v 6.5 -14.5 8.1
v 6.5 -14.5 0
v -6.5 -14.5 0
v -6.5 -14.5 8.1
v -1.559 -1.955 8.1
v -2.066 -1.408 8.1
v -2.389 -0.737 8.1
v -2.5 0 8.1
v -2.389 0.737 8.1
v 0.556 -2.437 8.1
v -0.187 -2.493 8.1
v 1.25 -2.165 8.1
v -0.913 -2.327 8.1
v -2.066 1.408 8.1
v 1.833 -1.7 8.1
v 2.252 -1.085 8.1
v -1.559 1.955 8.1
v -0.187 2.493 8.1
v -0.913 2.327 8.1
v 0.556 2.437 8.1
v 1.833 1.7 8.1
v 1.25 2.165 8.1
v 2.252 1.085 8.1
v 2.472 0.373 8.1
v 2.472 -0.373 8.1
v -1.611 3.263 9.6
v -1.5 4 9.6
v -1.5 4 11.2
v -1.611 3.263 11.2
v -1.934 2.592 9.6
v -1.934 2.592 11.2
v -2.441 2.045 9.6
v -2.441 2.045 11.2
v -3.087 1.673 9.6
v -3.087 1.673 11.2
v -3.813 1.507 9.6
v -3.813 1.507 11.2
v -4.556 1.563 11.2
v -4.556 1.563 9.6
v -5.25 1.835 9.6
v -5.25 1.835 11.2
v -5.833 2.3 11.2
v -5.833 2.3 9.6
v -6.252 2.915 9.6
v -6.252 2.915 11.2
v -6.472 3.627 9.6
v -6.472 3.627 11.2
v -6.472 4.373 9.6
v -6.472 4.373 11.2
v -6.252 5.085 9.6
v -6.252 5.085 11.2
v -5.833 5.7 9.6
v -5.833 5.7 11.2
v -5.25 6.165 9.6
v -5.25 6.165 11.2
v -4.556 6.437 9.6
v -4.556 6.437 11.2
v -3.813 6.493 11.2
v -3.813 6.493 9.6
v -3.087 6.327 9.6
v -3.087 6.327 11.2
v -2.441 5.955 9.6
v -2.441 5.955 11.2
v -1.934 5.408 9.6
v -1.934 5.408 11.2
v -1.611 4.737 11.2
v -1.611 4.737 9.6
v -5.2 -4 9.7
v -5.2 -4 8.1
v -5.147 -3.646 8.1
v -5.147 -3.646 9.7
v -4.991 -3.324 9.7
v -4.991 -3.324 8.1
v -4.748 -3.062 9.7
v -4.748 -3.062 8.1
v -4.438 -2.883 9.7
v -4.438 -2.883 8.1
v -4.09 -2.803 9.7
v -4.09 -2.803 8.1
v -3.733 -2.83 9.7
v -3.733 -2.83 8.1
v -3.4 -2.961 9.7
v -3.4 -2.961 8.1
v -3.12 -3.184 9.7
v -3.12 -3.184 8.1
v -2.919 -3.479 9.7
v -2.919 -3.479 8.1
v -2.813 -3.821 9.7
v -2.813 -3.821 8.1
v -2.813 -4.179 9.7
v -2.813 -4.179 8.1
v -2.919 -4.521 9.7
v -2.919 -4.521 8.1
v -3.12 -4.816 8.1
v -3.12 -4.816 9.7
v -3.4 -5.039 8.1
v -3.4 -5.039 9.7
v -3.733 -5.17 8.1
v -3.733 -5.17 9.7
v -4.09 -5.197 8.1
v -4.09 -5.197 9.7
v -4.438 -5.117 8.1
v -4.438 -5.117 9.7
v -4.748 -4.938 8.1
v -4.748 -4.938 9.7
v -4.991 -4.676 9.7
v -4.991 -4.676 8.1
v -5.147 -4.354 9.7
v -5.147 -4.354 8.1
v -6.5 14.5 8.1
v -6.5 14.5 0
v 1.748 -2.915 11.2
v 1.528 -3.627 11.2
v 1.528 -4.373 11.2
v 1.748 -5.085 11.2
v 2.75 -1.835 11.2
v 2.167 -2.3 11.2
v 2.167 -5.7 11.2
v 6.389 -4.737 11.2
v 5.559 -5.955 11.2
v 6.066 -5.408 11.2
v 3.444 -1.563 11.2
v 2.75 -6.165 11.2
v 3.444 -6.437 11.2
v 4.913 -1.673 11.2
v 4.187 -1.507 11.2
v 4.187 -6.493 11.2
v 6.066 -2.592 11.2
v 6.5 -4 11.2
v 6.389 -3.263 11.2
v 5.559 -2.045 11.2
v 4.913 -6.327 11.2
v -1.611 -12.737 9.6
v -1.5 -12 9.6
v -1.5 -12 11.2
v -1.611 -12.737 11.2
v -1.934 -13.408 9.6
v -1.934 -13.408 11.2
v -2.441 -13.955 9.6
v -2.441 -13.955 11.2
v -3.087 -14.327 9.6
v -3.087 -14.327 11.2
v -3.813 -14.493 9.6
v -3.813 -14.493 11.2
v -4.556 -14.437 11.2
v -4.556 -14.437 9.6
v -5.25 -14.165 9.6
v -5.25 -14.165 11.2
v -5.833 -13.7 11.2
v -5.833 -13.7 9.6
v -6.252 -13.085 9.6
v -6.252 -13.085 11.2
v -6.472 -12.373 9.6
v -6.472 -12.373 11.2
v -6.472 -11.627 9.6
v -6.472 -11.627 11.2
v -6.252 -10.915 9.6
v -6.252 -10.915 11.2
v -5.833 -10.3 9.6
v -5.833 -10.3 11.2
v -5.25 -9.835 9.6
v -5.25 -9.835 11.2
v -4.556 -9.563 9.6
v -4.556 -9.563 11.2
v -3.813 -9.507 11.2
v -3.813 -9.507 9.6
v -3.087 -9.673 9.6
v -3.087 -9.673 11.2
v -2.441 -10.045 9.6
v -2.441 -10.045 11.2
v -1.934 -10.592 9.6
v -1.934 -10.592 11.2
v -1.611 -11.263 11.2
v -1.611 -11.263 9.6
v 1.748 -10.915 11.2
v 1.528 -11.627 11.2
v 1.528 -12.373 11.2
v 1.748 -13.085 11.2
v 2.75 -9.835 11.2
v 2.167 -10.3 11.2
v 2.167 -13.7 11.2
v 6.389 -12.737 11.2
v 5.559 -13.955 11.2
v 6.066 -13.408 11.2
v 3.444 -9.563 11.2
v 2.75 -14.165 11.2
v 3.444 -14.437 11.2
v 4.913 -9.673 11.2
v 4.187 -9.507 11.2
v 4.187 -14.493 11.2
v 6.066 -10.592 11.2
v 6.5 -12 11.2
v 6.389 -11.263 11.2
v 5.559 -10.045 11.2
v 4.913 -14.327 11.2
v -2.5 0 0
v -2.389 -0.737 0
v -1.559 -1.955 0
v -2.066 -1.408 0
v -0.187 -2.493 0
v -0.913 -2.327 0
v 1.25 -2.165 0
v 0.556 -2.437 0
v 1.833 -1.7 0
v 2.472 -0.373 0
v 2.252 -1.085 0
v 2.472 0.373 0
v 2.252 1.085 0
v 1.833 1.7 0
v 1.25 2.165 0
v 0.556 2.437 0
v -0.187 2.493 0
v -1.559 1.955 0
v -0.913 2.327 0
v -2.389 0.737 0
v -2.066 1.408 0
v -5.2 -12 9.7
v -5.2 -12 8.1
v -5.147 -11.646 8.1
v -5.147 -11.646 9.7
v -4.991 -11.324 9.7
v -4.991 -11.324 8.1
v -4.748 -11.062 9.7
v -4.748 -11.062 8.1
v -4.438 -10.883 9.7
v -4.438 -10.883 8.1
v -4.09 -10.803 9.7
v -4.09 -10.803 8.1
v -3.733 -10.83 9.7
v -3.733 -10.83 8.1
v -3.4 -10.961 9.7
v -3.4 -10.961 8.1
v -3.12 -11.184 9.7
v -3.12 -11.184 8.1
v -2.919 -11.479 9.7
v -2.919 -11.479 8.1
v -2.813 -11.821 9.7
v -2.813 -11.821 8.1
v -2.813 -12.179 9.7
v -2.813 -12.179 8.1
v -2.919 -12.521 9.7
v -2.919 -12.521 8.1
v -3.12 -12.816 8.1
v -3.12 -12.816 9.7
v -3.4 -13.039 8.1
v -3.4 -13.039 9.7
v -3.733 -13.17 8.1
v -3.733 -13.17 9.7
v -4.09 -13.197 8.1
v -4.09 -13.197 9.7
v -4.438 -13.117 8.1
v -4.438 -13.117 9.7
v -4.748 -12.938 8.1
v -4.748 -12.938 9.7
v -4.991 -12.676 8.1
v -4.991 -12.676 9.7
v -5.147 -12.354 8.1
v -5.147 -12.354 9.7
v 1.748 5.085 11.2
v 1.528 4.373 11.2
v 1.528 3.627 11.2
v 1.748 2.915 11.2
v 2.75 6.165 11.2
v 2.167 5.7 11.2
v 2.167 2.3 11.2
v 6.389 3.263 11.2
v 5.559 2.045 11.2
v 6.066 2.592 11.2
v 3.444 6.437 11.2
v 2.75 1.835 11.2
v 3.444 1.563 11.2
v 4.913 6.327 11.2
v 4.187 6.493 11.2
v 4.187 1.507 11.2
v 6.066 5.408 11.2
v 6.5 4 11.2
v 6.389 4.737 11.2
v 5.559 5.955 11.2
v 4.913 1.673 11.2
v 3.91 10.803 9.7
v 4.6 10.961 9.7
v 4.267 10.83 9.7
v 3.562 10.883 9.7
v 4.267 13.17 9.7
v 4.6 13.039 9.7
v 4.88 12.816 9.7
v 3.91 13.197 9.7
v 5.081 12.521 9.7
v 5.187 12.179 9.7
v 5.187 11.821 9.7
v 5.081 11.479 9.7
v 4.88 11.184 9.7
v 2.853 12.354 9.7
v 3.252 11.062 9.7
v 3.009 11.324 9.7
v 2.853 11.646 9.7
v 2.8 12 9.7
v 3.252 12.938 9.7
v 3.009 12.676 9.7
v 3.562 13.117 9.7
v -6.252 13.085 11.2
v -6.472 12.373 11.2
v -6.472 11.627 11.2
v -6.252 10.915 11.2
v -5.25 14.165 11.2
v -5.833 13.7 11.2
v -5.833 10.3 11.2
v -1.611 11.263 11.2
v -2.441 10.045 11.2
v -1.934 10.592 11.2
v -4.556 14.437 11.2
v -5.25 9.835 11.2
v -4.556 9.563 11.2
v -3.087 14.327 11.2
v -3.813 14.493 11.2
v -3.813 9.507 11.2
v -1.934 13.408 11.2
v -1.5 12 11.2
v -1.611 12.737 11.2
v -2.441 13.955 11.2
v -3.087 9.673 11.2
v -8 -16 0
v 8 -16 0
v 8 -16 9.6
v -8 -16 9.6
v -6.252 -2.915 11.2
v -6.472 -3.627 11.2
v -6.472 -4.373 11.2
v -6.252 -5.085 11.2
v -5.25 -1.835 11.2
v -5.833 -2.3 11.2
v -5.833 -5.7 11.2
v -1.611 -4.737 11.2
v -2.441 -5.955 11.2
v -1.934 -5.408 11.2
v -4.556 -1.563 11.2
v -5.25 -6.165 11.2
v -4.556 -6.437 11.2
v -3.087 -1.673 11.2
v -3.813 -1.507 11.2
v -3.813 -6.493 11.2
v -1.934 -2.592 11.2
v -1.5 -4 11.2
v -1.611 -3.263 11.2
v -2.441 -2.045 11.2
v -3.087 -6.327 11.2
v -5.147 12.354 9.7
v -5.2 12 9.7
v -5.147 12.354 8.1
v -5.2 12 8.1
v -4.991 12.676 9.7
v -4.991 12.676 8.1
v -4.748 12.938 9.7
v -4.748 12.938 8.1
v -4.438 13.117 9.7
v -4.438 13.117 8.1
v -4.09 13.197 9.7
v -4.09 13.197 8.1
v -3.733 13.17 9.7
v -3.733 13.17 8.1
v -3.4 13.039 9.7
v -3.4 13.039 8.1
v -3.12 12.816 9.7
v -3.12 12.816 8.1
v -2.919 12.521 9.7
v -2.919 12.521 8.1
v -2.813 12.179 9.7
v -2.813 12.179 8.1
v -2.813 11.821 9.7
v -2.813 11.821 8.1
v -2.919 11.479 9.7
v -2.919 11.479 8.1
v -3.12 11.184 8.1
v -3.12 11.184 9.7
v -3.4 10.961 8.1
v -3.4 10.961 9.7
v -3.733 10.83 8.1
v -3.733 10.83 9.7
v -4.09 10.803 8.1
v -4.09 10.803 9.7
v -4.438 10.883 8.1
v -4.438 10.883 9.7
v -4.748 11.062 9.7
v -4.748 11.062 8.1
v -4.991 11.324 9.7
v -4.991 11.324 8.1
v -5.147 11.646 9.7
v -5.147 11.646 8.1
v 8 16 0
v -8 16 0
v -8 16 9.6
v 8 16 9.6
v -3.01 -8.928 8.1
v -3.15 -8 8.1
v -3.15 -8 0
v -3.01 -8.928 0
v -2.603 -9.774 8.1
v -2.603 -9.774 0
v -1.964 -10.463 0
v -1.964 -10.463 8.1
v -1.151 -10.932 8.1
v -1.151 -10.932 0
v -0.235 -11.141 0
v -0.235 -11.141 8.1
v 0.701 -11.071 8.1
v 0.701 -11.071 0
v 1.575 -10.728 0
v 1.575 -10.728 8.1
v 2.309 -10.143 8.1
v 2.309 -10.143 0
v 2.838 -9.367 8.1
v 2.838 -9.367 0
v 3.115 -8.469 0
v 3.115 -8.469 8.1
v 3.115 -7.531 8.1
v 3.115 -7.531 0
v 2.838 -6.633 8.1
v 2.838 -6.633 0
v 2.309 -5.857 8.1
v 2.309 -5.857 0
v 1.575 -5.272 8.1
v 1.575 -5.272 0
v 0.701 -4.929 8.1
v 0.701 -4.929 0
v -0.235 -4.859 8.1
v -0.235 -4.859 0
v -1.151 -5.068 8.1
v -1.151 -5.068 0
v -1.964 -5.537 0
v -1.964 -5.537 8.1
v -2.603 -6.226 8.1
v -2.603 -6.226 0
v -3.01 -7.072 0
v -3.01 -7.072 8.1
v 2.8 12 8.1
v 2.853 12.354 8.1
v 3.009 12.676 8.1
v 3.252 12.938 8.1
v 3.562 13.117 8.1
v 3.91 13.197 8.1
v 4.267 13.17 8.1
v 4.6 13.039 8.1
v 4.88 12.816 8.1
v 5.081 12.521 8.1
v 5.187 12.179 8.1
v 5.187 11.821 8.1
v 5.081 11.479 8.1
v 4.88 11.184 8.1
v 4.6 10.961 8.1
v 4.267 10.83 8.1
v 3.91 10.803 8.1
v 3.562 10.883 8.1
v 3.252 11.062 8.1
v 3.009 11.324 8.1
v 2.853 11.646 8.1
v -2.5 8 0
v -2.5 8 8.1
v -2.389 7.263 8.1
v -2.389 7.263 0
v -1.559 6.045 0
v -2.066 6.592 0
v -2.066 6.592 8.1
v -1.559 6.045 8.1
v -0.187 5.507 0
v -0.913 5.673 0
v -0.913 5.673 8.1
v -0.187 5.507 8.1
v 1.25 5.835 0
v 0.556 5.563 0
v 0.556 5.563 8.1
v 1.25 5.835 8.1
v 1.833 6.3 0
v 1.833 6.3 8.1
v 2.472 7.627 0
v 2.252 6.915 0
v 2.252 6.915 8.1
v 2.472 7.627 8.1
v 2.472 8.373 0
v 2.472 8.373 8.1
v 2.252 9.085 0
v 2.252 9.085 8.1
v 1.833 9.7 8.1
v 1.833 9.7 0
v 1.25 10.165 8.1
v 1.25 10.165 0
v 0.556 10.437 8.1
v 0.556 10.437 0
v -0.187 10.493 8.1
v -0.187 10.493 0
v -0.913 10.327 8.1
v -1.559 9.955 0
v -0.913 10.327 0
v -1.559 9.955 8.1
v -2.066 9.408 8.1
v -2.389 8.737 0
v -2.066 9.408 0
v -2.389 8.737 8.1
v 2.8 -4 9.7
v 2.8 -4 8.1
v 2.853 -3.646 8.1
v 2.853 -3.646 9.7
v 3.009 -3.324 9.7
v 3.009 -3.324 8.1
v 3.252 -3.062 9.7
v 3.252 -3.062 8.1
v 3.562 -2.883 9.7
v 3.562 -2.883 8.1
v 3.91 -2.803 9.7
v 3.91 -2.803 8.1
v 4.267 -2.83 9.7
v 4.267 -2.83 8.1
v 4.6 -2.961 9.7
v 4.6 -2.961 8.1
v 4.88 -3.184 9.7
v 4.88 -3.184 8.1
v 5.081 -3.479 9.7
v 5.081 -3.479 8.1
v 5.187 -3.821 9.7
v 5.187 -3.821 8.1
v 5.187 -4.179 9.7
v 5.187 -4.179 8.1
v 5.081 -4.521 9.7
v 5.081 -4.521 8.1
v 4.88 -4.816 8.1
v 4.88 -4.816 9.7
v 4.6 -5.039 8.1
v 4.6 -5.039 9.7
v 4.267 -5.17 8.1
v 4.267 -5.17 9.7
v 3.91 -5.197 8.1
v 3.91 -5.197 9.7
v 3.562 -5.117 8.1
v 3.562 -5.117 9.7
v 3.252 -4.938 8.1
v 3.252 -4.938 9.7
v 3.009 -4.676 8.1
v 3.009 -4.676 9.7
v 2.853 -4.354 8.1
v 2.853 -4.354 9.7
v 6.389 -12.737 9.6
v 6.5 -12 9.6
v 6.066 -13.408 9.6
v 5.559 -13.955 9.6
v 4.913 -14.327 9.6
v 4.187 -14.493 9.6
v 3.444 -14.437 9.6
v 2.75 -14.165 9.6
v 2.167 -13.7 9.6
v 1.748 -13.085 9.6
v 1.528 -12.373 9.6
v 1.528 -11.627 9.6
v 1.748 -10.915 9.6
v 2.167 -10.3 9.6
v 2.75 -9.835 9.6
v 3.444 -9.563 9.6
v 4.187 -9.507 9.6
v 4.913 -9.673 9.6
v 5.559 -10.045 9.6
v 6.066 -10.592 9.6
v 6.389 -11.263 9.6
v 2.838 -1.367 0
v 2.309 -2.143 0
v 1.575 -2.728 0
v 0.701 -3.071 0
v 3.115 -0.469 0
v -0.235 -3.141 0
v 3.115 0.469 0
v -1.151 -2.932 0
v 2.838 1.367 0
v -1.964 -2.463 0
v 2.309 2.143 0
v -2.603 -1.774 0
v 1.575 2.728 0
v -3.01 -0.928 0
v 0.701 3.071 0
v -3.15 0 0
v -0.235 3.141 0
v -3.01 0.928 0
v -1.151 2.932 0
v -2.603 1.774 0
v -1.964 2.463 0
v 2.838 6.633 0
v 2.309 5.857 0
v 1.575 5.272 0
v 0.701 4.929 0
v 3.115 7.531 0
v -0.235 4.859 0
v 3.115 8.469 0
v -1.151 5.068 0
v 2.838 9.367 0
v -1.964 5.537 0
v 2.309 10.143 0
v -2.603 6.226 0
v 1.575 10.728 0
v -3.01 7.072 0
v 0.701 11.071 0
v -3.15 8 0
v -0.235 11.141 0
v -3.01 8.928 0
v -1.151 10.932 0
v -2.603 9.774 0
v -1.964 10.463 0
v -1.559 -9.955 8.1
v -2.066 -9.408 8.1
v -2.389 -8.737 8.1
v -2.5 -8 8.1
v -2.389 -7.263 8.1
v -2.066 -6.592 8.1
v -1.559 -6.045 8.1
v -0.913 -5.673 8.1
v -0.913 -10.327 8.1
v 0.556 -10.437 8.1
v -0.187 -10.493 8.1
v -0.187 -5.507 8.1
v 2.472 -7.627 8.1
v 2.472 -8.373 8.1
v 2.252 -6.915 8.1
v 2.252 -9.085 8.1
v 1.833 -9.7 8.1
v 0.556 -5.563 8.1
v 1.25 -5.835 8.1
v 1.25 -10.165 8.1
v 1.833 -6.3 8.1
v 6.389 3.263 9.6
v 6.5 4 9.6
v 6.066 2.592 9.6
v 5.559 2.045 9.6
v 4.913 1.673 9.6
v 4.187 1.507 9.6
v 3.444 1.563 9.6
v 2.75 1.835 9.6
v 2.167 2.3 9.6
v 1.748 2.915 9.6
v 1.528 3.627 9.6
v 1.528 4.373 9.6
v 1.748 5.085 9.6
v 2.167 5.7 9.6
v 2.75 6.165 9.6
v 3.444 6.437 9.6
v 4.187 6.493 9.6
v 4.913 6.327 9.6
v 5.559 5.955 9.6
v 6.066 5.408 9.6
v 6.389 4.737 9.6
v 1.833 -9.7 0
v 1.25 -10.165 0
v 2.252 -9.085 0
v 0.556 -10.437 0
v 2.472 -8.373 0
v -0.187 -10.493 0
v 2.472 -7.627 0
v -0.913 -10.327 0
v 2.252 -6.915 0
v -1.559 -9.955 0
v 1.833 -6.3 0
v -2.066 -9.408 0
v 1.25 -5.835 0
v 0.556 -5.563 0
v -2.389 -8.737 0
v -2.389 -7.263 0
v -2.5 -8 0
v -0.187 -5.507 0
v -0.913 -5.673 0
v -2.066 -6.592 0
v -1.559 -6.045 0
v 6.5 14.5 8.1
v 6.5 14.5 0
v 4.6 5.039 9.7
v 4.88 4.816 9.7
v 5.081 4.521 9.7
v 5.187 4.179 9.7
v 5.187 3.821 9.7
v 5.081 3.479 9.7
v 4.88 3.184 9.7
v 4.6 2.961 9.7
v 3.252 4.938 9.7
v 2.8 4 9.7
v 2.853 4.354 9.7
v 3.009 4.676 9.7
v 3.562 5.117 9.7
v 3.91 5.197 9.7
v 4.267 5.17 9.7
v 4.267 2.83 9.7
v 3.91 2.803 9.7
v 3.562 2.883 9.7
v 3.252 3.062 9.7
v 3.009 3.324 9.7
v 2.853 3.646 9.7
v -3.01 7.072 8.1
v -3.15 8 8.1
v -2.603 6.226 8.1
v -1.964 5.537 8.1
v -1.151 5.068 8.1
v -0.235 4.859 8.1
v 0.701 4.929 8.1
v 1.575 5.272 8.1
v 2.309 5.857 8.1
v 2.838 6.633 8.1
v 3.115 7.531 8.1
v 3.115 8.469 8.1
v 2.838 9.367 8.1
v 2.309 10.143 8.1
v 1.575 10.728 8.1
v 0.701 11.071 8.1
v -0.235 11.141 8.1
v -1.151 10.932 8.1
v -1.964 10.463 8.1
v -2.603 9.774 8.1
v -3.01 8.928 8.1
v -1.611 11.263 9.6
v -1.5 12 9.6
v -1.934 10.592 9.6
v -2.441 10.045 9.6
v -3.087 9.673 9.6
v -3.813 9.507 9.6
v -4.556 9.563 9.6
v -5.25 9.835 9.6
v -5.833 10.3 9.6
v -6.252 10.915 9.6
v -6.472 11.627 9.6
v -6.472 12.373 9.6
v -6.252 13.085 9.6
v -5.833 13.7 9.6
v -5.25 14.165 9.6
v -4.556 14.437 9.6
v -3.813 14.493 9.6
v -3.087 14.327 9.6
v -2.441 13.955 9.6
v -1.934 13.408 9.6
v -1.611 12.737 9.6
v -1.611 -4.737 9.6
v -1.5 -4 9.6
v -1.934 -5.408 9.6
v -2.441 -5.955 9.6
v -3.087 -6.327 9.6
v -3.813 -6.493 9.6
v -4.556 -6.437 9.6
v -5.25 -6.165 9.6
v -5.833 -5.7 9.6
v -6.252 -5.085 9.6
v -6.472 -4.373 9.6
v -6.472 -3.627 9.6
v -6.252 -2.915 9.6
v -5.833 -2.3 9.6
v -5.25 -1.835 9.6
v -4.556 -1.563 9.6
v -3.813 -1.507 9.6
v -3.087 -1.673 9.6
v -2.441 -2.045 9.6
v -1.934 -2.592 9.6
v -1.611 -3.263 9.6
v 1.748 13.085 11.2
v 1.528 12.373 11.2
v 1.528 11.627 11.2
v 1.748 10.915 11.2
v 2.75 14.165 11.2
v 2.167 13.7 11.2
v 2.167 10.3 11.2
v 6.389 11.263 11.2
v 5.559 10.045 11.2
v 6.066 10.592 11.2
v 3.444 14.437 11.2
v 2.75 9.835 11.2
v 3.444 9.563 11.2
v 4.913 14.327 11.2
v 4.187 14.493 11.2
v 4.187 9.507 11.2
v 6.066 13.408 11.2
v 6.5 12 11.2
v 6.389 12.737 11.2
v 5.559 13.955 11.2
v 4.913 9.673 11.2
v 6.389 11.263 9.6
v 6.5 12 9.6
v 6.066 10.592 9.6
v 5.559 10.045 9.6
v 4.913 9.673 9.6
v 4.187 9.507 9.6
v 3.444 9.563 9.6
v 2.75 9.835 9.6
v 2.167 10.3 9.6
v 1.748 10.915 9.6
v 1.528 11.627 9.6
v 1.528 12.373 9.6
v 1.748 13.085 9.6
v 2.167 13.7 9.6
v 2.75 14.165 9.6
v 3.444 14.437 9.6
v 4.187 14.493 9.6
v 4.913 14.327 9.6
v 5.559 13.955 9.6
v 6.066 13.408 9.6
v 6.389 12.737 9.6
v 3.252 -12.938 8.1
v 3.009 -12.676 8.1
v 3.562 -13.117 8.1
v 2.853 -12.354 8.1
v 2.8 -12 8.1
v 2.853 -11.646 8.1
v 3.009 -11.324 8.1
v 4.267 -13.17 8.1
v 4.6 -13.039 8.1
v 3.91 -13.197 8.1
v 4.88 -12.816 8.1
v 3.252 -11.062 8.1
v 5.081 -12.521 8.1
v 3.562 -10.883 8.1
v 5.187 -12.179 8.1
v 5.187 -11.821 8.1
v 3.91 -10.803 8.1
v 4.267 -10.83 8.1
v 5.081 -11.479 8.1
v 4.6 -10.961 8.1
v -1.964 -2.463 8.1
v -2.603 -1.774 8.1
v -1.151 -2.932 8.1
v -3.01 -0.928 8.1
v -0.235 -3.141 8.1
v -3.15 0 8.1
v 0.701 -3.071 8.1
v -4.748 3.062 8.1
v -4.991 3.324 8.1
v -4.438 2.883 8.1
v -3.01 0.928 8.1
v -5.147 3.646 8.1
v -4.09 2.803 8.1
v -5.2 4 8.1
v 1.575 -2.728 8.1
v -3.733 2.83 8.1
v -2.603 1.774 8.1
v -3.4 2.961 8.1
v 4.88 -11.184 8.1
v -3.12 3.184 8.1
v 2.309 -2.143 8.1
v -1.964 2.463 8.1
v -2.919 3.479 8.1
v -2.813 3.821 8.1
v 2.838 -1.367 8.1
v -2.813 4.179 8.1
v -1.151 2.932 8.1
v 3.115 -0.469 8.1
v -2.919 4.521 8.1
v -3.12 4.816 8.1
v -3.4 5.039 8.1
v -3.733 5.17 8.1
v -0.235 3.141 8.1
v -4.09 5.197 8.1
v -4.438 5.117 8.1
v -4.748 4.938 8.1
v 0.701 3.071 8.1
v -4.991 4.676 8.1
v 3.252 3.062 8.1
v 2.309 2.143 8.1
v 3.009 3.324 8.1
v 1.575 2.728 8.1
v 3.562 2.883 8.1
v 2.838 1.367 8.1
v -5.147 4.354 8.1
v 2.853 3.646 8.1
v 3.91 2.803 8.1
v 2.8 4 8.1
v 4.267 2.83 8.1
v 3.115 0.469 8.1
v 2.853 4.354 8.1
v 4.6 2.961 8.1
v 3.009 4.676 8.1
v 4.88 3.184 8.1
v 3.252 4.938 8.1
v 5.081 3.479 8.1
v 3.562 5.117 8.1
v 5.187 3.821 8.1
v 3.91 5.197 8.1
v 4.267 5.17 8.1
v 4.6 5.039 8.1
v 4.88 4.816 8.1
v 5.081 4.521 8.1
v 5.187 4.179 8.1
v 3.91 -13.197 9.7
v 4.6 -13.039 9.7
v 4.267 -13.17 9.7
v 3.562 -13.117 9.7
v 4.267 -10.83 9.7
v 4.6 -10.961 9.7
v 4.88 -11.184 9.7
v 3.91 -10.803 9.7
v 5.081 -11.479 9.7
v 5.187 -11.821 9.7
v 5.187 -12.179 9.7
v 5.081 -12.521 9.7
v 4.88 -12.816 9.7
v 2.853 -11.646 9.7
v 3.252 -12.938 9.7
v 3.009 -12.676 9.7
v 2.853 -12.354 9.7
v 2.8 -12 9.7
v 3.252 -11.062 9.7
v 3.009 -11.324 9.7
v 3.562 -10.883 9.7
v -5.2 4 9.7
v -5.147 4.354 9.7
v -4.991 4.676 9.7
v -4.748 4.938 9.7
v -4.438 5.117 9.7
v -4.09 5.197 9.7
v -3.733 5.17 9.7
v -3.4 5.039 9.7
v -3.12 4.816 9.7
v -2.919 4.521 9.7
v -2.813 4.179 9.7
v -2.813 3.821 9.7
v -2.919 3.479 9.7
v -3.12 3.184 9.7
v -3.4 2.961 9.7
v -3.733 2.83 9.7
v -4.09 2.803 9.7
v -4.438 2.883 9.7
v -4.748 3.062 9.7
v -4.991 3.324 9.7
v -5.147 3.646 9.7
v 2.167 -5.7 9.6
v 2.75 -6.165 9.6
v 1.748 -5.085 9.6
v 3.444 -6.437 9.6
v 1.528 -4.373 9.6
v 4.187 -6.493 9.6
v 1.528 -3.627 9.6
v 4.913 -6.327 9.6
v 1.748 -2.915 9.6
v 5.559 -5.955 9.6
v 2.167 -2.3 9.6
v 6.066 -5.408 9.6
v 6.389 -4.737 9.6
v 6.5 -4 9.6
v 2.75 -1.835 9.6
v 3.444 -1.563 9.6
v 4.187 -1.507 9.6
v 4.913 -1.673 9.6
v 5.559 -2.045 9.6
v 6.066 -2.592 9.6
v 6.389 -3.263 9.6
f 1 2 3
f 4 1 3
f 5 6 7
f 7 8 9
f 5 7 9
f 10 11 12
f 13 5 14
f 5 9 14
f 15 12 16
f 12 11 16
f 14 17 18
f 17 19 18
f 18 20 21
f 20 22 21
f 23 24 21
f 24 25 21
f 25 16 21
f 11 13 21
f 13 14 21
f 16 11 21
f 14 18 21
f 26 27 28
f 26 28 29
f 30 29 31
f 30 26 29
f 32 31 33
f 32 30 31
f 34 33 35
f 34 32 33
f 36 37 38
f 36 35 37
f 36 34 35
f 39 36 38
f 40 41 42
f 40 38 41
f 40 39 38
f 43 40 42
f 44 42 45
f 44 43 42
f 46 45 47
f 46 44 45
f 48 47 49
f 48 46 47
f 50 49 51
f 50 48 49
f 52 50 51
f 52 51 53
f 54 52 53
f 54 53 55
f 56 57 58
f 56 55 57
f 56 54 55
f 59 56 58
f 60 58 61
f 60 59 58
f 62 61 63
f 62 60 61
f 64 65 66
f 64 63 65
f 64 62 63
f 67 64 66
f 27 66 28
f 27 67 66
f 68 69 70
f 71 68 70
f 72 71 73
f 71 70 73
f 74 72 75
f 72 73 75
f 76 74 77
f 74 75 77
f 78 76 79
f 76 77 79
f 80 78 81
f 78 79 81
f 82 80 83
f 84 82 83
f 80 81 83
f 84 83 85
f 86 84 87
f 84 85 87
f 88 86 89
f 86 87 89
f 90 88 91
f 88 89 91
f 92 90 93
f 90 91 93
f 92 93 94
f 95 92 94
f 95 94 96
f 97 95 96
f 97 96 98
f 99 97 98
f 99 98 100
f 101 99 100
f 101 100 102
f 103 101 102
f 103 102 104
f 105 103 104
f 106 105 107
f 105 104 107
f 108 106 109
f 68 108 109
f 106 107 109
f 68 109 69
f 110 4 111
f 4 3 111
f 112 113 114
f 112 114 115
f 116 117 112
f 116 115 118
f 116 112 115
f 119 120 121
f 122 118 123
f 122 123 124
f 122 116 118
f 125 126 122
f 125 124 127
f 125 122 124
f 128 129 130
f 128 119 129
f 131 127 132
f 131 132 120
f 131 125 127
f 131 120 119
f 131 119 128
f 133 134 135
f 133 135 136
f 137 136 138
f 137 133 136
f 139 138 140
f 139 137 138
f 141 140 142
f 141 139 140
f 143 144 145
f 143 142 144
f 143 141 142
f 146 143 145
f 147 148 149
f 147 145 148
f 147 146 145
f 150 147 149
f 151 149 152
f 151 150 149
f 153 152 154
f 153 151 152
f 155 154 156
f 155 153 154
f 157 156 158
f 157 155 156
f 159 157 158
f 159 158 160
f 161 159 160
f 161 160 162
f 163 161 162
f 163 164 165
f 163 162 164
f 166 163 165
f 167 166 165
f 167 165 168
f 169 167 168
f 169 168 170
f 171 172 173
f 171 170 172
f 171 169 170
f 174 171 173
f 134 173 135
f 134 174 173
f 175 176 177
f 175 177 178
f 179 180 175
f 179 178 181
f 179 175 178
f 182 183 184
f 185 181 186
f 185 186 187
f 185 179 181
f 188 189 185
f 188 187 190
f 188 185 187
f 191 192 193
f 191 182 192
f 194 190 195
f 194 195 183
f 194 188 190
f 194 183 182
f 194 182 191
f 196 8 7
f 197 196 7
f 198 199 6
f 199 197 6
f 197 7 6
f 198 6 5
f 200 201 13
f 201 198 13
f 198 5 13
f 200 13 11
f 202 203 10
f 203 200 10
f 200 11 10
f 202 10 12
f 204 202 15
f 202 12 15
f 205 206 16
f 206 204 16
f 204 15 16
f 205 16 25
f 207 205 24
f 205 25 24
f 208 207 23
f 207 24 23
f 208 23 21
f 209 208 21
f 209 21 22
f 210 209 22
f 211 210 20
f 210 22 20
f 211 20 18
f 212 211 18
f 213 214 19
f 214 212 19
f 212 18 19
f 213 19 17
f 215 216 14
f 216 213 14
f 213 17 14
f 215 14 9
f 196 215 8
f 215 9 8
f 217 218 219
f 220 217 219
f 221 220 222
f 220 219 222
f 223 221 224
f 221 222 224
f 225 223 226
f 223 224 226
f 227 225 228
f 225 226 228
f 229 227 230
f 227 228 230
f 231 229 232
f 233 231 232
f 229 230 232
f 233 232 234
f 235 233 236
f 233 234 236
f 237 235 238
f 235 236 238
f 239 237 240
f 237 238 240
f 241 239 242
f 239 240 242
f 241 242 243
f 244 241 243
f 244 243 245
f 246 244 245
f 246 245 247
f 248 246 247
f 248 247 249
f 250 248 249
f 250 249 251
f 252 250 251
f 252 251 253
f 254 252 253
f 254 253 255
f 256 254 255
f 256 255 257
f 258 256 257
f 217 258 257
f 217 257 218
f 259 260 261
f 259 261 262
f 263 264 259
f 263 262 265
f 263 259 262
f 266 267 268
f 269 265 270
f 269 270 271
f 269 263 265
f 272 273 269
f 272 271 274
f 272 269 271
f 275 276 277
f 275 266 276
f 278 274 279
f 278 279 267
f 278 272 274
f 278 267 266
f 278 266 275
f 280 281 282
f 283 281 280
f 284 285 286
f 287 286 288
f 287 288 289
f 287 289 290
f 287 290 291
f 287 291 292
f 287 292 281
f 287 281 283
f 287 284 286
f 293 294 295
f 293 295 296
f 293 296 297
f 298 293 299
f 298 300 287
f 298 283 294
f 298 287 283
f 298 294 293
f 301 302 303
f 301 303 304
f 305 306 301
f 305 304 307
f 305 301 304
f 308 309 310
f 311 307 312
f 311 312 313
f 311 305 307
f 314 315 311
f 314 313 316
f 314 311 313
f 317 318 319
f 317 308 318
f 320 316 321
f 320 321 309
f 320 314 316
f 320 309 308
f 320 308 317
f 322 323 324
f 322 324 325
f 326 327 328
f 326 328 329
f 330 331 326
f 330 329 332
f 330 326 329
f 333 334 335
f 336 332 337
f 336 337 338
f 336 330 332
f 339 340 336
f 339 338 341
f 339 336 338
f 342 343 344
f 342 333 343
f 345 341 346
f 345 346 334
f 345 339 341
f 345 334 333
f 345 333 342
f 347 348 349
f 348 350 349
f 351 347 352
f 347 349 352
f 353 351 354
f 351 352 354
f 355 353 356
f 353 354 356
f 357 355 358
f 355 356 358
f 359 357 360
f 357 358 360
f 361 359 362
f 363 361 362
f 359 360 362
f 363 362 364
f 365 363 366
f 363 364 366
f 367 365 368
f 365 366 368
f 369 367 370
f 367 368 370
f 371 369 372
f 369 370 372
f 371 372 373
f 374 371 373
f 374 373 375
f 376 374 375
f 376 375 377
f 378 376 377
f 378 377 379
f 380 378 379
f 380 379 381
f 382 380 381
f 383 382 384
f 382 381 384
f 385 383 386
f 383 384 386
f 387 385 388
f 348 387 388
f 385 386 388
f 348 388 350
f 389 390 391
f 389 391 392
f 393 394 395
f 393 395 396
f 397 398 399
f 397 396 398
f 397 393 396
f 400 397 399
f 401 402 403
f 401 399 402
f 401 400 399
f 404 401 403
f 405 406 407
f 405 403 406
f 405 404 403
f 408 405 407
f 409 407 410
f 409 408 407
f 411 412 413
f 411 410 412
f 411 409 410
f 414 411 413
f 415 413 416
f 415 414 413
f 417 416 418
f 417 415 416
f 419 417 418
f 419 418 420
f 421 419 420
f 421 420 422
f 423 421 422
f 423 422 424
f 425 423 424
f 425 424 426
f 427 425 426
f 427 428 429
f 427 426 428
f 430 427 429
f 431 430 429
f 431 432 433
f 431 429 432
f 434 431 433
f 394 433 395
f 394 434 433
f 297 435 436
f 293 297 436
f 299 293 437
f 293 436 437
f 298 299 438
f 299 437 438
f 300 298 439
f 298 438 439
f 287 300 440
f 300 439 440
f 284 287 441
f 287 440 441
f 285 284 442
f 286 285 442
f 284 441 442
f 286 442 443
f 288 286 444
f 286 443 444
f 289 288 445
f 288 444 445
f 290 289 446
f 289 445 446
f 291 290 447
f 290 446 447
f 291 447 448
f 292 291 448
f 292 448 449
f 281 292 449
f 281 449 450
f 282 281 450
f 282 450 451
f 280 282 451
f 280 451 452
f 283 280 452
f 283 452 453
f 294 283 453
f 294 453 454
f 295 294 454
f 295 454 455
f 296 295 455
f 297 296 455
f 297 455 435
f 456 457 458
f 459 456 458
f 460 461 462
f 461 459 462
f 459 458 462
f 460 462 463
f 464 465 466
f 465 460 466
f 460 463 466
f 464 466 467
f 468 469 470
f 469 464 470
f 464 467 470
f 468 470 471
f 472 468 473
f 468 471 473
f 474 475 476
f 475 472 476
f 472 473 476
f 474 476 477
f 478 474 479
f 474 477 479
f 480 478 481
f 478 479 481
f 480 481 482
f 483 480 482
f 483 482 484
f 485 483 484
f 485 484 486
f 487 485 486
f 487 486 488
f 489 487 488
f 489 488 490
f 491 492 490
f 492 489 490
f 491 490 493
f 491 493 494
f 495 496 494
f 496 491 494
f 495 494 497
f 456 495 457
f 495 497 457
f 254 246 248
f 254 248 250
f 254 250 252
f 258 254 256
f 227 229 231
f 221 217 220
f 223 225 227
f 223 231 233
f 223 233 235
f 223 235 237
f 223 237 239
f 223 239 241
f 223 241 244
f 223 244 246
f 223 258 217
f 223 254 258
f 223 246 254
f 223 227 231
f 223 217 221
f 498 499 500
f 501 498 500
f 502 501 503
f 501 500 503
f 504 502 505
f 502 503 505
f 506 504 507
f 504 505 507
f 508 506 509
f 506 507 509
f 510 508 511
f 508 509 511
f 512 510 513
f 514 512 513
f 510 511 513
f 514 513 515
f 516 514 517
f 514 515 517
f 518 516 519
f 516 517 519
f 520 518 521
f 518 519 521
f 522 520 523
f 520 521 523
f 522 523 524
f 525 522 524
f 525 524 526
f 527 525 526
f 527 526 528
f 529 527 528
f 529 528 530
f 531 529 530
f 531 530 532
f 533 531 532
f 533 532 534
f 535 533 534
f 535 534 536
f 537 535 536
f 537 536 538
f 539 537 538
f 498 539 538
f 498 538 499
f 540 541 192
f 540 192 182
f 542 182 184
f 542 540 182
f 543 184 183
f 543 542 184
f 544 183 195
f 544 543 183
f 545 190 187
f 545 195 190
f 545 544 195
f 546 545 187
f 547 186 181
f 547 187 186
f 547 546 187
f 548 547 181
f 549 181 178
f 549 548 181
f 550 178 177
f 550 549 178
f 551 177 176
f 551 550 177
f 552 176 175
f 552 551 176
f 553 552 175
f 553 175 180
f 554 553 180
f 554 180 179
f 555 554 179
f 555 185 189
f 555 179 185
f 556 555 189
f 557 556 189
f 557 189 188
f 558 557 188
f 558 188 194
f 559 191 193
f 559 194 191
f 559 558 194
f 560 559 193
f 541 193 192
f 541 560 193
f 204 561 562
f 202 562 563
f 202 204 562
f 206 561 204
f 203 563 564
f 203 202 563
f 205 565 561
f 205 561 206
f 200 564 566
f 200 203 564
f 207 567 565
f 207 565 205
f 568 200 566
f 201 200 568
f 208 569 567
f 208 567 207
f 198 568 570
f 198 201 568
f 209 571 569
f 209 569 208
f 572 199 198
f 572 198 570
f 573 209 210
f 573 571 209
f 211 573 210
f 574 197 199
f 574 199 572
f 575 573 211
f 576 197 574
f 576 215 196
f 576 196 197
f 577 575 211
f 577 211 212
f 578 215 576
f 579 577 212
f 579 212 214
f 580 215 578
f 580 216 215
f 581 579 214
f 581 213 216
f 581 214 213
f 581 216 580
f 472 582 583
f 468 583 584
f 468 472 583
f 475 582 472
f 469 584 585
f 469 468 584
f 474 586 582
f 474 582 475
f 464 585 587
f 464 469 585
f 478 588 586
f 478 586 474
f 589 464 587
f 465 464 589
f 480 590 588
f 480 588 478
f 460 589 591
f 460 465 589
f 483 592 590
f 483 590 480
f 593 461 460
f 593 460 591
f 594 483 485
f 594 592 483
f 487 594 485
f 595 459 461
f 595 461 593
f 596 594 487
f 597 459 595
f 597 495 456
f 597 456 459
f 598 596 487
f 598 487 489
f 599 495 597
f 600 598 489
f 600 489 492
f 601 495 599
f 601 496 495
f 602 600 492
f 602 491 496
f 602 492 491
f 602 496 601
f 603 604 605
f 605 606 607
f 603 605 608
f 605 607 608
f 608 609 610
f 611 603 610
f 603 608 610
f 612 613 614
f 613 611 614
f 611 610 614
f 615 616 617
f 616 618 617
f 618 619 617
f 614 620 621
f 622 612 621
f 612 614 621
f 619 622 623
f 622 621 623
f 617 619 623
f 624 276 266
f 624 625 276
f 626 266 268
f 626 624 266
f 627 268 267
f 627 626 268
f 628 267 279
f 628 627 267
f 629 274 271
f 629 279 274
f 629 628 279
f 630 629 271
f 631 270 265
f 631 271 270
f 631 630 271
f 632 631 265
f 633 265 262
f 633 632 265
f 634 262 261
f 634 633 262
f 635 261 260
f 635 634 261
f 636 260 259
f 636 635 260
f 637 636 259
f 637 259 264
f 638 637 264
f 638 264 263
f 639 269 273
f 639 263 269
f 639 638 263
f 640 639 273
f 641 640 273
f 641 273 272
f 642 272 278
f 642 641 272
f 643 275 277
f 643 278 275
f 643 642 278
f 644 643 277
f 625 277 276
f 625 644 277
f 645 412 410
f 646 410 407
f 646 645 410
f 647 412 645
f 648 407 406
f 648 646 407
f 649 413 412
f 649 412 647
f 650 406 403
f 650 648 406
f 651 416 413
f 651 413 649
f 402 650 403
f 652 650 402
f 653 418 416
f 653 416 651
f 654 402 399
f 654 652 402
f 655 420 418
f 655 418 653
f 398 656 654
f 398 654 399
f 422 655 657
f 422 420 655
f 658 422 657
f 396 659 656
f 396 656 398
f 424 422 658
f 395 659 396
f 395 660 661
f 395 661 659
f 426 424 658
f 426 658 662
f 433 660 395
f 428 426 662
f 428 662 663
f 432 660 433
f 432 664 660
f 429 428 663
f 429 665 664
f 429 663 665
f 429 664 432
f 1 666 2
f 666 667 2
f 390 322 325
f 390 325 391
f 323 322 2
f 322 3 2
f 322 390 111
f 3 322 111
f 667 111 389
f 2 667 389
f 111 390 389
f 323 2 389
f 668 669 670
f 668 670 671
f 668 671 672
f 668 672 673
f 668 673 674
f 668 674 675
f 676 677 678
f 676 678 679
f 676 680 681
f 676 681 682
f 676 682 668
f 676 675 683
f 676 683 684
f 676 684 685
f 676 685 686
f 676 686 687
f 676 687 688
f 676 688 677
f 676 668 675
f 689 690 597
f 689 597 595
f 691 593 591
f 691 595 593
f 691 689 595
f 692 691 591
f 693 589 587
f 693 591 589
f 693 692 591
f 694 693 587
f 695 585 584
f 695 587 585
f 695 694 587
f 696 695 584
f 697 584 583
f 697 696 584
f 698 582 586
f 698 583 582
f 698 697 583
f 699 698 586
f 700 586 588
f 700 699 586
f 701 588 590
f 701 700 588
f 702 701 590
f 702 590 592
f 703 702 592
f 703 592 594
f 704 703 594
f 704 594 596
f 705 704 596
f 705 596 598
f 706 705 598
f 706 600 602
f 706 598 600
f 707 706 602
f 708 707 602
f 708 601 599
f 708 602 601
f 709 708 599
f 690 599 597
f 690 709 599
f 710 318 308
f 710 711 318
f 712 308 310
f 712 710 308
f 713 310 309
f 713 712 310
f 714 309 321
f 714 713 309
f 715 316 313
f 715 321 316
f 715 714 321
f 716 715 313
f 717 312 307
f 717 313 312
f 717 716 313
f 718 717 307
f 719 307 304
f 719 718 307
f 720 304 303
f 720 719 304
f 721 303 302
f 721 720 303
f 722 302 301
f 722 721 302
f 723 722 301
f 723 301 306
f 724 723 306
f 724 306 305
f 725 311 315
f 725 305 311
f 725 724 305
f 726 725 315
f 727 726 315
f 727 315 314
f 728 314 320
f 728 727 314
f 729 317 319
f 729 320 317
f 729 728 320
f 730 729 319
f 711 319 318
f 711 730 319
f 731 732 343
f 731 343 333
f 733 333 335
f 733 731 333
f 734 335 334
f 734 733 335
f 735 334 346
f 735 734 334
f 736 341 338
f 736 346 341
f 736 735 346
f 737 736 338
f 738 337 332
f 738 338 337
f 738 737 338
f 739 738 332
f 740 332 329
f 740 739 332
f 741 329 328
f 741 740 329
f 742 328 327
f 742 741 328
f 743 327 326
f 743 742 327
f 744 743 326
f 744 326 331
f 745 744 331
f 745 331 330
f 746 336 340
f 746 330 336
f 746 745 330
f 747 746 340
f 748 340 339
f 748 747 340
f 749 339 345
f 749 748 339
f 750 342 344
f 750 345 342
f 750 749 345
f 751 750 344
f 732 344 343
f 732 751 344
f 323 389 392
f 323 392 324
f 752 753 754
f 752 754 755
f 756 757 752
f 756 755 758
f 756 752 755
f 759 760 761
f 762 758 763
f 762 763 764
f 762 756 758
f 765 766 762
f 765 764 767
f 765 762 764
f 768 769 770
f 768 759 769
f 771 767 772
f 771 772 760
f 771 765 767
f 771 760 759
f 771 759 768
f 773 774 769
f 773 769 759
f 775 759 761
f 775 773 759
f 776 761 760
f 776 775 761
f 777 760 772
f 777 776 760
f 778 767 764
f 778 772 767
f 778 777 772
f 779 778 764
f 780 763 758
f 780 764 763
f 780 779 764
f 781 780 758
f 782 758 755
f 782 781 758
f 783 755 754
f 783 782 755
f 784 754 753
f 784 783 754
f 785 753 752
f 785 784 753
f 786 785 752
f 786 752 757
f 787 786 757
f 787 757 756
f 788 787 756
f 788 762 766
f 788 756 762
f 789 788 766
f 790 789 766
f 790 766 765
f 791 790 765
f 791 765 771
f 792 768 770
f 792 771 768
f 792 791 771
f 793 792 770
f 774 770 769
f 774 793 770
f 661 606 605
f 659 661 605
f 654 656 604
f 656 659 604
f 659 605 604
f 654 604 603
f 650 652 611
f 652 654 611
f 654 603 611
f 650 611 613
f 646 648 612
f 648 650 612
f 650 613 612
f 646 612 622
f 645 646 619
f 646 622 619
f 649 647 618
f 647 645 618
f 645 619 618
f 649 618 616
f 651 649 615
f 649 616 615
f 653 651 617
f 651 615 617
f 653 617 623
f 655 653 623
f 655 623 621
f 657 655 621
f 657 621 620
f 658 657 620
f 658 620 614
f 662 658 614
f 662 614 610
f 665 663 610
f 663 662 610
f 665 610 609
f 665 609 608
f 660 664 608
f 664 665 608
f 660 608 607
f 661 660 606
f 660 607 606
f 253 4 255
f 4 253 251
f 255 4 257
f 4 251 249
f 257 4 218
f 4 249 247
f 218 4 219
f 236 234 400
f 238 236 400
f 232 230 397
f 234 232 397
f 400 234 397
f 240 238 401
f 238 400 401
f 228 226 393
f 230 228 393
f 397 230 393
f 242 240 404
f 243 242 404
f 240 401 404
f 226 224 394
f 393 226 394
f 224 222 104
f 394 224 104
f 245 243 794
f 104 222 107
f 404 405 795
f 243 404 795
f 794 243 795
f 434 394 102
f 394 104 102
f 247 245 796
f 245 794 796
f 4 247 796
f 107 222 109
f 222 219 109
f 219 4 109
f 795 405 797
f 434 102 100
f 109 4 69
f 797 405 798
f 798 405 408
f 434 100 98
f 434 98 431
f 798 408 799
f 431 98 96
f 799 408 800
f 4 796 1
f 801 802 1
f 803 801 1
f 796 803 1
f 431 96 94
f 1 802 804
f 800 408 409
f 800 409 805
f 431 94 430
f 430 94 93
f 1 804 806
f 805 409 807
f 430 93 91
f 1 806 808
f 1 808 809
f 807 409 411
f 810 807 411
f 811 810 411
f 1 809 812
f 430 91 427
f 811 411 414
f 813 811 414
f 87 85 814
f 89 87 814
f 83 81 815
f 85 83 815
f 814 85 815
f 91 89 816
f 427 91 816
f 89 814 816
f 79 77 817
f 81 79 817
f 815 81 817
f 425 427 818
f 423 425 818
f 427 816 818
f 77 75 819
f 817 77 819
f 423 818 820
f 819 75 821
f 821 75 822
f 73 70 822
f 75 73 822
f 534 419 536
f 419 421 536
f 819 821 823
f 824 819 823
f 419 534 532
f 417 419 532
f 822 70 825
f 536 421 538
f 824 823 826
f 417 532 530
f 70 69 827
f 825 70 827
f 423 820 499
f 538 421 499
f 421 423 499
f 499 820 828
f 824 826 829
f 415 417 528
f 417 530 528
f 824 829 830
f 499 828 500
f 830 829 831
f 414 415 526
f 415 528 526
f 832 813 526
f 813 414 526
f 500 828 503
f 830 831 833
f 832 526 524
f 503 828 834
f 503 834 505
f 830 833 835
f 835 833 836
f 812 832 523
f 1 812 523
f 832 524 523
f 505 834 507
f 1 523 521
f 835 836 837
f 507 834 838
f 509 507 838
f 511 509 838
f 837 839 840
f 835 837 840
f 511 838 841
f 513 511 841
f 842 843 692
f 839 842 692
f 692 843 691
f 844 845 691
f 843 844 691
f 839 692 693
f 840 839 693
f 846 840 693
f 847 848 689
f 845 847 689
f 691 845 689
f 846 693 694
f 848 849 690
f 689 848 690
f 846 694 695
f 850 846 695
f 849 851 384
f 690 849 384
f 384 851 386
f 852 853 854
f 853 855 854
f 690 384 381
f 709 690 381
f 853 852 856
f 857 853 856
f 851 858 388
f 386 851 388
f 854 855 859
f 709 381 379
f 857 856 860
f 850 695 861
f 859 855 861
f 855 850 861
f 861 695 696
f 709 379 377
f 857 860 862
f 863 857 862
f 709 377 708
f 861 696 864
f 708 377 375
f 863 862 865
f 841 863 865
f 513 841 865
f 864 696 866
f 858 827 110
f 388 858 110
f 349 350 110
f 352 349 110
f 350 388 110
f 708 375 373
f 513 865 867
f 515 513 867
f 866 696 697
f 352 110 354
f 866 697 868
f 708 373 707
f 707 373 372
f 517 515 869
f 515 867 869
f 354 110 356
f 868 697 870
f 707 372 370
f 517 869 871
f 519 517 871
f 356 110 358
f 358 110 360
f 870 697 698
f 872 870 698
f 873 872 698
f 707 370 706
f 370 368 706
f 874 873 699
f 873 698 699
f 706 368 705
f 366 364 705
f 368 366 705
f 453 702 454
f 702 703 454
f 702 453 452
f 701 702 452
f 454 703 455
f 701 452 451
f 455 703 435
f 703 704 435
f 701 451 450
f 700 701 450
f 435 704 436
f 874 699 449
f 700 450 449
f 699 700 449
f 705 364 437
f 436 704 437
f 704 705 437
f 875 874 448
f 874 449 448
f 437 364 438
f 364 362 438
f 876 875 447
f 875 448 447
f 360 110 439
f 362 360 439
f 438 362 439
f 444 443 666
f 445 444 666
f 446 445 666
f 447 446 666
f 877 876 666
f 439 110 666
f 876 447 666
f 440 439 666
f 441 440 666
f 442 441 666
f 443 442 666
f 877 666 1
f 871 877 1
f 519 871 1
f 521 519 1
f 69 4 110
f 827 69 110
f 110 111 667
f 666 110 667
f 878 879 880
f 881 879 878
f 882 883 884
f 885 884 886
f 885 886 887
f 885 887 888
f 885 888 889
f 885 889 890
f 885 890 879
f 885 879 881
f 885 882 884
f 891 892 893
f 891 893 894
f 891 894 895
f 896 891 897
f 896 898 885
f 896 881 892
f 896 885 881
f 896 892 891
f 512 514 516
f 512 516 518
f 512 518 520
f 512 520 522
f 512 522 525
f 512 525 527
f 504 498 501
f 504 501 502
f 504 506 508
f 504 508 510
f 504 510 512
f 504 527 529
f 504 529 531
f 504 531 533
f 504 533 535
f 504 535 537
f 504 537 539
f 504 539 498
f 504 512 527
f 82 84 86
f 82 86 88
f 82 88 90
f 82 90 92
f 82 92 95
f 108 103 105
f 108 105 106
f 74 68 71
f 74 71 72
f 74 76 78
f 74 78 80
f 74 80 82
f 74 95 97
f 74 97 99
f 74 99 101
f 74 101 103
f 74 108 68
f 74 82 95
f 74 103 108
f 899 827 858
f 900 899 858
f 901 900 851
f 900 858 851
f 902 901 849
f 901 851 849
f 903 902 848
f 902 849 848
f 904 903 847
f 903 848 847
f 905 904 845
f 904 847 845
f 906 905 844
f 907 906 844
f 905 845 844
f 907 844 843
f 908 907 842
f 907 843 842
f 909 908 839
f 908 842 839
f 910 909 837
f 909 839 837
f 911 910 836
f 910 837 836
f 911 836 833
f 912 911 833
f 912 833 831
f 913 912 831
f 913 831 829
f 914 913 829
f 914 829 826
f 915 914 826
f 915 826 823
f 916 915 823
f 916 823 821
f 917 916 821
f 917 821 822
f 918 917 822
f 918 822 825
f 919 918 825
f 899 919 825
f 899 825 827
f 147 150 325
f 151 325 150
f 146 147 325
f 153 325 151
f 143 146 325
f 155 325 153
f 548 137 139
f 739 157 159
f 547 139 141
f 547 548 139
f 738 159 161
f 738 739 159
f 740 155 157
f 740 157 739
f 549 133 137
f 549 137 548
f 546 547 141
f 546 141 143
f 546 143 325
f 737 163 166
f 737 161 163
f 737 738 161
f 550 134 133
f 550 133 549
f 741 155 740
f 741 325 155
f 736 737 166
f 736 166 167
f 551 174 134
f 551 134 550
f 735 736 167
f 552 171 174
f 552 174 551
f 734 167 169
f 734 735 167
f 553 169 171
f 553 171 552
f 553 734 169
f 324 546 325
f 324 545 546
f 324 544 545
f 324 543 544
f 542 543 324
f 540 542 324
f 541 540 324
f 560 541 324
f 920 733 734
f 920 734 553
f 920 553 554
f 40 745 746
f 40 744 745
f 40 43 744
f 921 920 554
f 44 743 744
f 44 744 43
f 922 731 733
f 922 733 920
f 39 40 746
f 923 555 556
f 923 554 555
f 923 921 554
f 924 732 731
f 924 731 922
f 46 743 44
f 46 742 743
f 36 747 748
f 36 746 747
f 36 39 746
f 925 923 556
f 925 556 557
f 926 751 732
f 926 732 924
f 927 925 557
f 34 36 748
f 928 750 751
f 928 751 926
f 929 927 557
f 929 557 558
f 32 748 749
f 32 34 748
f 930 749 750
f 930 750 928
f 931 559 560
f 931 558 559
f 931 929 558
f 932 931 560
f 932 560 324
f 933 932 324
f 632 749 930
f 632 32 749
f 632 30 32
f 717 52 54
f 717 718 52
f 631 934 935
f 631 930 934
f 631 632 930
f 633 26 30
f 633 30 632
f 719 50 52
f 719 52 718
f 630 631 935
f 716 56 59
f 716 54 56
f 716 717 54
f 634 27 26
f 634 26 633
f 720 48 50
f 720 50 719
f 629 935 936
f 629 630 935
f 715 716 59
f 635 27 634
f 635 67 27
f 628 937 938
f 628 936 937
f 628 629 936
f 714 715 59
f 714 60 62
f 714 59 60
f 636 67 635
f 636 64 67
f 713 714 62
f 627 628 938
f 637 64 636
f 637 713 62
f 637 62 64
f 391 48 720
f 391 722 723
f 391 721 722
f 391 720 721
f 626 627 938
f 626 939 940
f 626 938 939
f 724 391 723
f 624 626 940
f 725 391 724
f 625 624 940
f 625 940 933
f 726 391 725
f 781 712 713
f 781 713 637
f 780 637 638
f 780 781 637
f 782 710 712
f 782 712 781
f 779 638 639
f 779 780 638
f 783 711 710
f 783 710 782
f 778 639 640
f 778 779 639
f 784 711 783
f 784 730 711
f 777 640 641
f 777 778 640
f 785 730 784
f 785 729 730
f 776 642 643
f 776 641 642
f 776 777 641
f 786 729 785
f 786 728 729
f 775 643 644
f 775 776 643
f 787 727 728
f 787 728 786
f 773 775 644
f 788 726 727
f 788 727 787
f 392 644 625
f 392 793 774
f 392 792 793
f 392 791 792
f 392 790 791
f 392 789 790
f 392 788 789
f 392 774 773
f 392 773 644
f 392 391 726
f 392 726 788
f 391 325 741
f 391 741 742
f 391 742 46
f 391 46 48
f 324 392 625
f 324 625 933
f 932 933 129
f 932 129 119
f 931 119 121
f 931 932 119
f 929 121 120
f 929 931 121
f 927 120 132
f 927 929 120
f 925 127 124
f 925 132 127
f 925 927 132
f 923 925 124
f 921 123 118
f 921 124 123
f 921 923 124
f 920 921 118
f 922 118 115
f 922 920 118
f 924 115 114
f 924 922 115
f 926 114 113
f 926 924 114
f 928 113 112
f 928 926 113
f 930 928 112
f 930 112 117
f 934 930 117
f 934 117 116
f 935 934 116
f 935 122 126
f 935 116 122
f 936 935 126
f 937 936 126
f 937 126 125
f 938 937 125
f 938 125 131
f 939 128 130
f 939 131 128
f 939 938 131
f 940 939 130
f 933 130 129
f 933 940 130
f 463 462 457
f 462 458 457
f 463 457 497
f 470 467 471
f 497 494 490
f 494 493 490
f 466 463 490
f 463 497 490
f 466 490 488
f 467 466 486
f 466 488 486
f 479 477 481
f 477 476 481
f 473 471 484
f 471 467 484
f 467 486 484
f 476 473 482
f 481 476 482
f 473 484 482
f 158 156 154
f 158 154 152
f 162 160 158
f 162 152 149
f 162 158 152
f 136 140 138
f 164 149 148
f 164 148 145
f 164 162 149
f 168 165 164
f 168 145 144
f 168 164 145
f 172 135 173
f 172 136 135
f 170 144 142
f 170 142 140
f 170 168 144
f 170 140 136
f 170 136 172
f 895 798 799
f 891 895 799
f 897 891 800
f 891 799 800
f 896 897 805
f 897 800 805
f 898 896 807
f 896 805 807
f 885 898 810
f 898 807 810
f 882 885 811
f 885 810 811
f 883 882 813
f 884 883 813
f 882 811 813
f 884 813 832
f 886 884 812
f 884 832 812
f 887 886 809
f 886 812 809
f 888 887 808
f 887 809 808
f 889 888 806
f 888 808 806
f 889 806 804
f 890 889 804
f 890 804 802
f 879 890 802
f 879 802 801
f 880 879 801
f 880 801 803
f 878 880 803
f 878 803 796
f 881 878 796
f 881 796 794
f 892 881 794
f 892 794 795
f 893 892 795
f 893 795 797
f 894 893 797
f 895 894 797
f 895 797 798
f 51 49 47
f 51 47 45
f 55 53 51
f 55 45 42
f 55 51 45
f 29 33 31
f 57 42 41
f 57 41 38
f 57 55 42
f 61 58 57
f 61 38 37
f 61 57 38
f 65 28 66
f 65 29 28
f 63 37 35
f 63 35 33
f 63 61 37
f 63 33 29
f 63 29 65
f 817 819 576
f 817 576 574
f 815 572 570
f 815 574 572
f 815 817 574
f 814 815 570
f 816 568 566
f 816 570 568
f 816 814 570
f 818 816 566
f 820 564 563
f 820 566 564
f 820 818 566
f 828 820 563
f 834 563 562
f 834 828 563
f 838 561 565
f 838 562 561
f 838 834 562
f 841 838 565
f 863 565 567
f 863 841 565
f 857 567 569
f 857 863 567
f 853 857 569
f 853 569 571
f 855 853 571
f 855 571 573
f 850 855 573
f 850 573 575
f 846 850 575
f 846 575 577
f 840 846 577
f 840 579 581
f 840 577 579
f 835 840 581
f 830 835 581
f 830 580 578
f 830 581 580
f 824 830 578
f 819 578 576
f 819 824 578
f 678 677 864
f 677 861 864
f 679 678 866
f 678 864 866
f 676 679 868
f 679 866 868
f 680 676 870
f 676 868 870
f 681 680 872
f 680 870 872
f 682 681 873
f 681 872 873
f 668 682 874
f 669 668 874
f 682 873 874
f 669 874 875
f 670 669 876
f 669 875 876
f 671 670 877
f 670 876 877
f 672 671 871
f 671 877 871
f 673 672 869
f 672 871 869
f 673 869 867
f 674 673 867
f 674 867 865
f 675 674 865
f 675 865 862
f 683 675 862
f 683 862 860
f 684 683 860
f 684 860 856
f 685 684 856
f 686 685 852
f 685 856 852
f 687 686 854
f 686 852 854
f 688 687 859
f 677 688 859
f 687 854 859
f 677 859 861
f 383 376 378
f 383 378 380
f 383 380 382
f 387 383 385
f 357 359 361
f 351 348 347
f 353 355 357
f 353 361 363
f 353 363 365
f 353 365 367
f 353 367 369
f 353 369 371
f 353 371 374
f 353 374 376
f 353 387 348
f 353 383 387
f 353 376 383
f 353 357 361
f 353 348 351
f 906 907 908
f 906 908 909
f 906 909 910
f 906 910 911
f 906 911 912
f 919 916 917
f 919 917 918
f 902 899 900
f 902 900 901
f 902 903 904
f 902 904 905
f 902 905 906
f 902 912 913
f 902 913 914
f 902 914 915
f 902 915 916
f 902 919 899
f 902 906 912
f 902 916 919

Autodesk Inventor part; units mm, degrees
ref_plane "YZ Plane" through (0, 0, 0) normal (1, 0, 0) x (0, 1, 0)
ref_plane "XZ Plane" through (0, 0, 0) normal (0, 1, 0) x (-1, 0, 0)
ref_plane "XY Plane" through (0, 0, 0) normal (0, 0, 1) x (1, 0, 0)
sketch "Sketch1" plane through (0, 0, 0) normal (0, 0, 1) x (1, 0, 0)
  line L0 (-8, 16) -> (8, 16)
  line L1 (8, 16) -> (8, -16)
  line L2 (8, -16) -> (-8, -16)
  line L3 (-8, -16) -> (-8, 16)
  point P0 (0, 0)
  dimension "d0" = 16
  dimension "d1" = 32
  dimension "d2" = 8
  dimension "d3" = 16
extrude "Extrusion1" add sketch "Sketch1" along normal blind 9.6
shell "Shell1" thickness 1.5 removed faces 1 at (-2.6667, -5.3333, 0)
sketch "Sketch2" plane through (0, 0, 9.6) normal (0, 0, 1) x (1, 0, 0)
  circle A0 centre (4, -12) radius 2.5
  line L0 (8, 16) -> (8, -16) projected
  line L1 (8, -16) -> (-8, -16) projected
  dimension "d7" = 5
  dimension "d10" = 4
  dimension "d11" = 4
extrude "Extrusion2" add sketch "Sketch2" along normal blind 1.6
sketch "Sketch3" plane through (6.5, -14.5, 8.1) normal (0, 0, -1) x (-1, 0, 0)
  circle A0 centre (2.5, 2.5) radius 2.5 projected
  circle A1 centre (2.5, 2.5) radius 1.2
  point P0 (6.5, 14.5)
  dimension "d18" = 2.4
extrude "Extrusion3" cut sketch "Sketch3" against normal blind 1.6 contours A1
pattern_linear "Rectangular Pattern1" count 4 spacing 8 along (0, 1, 0) count 2 spacing 8 along (-1, 0, 0) of "Extrusion2", "Extrusion3"
sketch "Sketch4" plane through (6.5, -14.5, 8.1) normal (0, 0, -1) x (-1, 0, 0)
  circle A0 centre (2.5, 10.5) radius 1.2 projected
  circle A1 centre (2.5, 2.5) radius 1.2 projected
  line L0 (0, 29) -> (0, 0) projected
  line L1 (0, 0) -> (13, 0) projected
  circle A2 centre (6.5, 6.5) radius 3.15
  circle A3 centre (6.5, 6.5) radius 2.5
  point P0 (6.5, 14.5)
  dimension "d21" = 6.5
  dimension "d22" = 6.5
  dimension "d23" = 10.5
  dimension "d24" = 2.5
  dimension "d25" = 5
  dimension "d26" = 6.3
extrude "Extrusion4" add sketch "Sketch4" along normal up to surface (8.1 mm away) contours A2
pattern_linear "Rectangular Pattern2" count 3 spacing 8 along (0, 1, 0) of "Extrusion4"
equation "\"d0\" = 8 * WIDTH"
equation "\"d1\" = 8 * LENGTH"
equation "\"d2\" = 0.5 * d0"
equation "\"d3\" = 0.5 * d1"
equation "\"d21\" = 0.5 * d23 + 0.5 * d24"
equation "\"d22\" = d21"
equation "\"WIDTH\" = 2"
equation "\"LENGTH\" = 4"
properties part number "3001" material "Steel"
